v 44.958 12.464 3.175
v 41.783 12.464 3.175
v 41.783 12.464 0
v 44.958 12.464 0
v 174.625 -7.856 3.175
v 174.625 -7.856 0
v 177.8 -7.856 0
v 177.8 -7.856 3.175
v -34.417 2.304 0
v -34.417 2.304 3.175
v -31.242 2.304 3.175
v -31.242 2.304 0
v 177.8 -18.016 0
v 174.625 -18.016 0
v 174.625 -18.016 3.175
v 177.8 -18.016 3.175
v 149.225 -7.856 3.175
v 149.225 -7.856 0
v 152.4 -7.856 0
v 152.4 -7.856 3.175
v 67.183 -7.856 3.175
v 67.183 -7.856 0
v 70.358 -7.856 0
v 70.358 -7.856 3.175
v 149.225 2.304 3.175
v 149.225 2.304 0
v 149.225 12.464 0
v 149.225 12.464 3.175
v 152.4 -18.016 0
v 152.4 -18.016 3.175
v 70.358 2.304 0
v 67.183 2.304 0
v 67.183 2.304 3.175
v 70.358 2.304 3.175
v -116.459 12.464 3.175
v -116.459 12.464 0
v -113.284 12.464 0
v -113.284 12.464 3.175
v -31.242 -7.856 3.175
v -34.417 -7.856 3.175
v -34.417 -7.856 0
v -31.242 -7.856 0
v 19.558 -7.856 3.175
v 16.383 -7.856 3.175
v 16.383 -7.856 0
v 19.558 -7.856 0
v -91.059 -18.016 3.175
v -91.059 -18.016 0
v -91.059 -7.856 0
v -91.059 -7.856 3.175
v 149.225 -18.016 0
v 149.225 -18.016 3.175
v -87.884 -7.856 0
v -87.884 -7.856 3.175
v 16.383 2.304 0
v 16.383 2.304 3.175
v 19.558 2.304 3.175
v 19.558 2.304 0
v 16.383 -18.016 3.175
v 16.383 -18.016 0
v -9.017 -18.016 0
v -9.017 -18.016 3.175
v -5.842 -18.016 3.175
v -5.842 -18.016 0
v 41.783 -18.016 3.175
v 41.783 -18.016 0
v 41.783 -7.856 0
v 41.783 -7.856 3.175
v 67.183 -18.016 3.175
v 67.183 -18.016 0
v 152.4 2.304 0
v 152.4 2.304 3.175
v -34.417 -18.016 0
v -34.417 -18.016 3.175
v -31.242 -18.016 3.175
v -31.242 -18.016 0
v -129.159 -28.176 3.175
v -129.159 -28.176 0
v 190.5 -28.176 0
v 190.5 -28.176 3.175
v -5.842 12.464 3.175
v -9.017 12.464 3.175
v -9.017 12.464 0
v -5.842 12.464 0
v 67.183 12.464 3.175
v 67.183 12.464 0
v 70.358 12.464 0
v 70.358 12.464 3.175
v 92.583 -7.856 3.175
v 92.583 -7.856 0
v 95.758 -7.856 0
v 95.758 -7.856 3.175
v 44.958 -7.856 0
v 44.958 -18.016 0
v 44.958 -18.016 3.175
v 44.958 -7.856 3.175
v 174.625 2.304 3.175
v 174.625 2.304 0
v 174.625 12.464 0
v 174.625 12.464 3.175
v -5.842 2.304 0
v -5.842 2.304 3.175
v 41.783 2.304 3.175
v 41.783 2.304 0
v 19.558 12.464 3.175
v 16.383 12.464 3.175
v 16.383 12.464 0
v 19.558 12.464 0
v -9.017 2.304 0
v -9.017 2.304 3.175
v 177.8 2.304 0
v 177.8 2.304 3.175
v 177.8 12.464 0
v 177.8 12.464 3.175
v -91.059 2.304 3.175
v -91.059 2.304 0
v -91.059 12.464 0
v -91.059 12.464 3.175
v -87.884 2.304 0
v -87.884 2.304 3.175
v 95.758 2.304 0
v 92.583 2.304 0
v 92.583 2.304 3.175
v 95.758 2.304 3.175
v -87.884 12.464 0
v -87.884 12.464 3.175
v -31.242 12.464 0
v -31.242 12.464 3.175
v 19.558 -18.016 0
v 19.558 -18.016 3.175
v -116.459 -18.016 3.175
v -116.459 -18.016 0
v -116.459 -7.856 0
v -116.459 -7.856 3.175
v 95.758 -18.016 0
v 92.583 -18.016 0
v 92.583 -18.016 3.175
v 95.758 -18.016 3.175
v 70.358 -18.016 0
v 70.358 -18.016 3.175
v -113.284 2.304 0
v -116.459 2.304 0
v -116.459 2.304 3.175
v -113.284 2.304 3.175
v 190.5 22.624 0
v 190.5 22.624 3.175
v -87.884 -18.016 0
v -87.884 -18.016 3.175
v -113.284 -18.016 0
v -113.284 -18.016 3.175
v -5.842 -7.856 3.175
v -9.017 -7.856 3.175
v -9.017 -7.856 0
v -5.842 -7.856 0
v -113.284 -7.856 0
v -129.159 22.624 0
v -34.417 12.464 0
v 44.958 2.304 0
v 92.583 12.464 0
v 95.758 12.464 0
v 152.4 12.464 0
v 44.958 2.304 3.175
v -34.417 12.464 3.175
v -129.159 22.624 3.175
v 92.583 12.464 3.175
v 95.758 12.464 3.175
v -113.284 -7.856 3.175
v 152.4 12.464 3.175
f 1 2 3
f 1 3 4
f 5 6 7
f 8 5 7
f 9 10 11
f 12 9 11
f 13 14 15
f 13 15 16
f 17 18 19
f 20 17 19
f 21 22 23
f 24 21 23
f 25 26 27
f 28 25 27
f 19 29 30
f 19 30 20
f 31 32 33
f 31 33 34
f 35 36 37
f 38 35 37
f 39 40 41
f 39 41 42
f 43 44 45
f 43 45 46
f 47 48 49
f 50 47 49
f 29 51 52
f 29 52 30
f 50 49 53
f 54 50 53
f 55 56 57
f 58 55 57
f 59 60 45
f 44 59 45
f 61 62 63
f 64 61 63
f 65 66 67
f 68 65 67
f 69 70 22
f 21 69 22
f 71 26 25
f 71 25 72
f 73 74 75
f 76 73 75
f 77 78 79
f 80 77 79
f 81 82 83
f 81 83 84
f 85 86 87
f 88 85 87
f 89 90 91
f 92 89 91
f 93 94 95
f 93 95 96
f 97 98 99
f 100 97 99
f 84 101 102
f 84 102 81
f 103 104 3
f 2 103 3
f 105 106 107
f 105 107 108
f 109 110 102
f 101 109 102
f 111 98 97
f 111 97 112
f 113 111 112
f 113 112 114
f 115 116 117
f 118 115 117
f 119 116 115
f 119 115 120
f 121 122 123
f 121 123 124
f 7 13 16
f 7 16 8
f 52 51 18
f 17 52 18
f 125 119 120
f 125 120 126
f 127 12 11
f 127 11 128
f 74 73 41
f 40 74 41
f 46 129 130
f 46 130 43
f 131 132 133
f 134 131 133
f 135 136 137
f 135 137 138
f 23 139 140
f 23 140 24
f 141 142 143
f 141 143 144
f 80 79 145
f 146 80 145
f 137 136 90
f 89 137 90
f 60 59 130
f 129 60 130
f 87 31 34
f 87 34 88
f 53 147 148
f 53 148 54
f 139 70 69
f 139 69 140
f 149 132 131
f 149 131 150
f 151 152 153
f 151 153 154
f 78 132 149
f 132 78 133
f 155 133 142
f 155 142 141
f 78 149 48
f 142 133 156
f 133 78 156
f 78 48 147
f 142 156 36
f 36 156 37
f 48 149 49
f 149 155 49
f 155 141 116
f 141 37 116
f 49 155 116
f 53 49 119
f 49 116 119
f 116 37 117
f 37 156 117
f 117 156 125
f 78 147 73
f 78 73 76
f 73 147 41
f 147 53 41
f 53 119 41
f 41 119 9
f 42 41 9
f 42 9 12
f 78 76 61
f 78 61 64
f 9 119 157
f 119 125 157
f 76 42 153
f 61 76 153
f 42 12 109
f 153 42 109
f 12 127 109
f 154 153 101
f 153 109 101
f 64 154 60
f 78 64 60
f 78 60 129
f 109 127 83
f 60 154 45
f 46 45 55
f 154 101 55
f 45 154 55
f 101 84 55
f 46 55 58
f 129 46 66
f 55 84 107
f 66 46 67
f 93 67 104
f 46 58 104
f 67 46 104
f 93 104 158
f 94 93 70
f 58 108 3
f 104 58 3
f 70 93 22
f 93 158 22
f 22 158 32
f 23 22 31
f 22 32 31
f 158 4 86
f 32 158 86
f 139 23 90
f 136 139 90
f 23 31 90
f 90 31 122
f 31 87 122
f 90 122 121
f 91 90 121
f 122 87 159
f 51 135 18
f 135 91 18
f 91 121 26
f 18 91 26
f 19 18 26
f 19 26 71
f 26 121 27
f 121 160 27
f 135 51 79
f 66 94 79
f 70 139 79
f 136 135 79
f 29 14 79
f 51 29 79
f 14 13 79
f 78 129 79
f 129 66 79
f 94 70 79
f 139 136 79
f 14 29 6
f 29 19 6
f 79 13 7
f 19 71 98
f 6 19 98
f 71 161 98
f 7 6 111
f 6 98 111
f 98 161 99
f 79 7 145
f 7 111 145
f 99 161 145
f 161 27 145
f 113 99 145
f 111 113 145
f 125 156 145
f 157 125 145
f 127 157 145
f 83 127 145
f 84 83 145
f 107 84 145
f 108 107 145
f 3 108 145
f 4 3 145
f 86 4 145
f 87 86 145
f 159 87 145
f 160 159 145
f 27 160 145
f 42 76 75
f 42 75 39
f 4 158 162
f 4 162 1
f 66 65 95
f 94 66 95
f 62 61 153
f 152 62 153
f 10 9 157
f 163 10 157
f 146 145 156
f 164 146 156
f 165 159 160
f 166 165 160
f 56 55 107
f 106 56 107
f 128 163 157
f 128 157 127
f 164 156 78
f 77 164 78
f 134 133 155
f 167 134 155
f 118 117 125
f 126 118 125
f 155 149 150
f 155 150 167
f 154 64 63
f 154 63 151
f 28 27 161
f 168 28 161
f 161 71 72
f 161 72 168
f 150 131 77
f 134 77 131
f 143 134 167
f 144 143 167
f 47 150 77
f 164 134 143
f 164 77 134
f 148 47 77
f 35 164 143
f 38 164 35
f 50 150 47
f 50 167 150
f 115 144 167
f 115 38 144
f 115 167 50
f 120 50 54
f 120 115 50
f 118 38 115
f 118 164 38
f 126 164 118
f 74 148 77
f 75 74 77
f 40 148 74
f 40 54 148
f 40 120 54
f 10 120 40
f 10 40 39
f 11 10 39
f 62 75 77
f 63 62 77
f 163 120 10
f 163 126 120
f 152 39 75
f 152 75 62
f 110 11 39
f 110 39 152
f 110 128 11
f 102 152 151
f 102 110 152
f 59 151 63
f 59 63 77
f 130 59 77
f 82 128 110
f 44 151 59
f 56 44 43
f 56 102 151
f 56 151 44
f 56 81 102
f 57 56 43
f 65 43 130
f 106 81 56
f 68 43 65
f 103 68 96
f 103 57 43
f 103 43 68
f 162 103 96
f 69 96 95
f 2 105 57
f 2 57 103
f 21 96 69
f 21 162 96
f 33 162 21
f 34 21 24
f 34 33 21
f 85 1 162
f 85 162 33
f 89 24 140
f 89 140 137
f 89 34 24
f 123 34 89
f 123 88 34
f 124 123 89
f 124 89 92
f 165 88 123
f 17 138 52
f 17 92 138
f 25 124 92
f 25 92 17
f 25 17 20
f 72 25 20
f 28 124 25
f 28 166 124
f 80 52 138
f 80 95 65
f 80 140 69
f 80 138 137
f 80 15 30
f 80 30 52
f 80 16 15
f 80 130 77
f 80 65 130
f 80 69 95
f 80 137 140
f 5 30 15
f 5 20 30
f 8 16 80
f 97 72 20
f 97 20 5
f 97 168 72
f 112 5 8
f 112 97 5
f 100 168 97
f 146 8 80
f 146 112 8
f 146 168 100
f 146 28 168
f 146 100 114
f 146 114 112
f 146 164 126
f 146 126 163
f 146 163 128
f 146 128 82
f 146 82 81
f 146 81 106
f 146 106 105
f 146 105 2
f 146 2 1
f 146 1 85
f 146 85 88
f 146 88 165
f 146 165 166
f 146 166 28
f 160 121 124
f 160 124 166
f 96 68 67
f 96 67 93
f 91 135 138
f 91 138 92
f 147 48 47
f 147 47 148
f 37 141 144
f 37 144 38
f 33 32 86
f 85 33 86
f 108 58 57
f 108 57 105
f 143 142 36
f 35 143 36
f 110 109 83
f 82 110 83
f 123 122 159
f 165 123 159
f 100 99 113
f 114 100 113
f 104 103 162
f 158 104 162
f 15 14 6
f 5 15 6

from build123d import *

# Parameters (mm, degrees)
F0_W     = 3.175
F0_H     = 10.16
F1_DEPTH = 3.175


with BuildPart() as f1:
    # F0 (on Top) → F1 (new body)
    with BuildSketch(Plane.XY):
        Polygon((-129.159, -28.17584), (190.5, -28.17584), (190.5, 22.624161), (177.8, 22.624161), (174.625, 22.624161), (152.4, 22.624161), (149.225, 22.624161), (-129.159, 22.624161), align=None)
        with Locations((-114.8715, -12.93584)):
            Rectangle(F0_W, F0_H, mode=Mode.SUBTRACT)
        with Locations((-89.4715, -12.93584)):
            Rectangle(F0_W, F0_H, mode=Mode.SUBTRACT)
        with Locations((-32.8295, -12.93584)):
            Rectangle(F0_W, F0_H, mode=Mode.SUBTRACT)
        with Locations((-7.4295, -12.93584)):
            Rectangle(F0_W, F0_H, mode=Mode.SUBTRACT)
        with Locations((17.9705, -12.93584)):
            Rectangle(F0_W, F0_H, mode=Mode.SUBTRACT)
        with Locations((43.3705, -12.93584)):
            Rectangle(F0_W, F0_H, mode=Mode.SUBTRACT)
        with Locations((68.7705, -12.93584)):
            Rectangle(F0_W, F0_H, mode=Mode.SUBTRACT)
        with Locations((94.1705, -12.93584)):
            Rectangle(F0_W, F0_H, mode=Mode.SUBTRACT)
        with Locations((150.8125, -12.93584)):
            Rectangle(F0_W, F0_H, mode=Mode.SUBTRACT)
        with Locations((176.2125, -12.93584)):
            Rectangle(F0_W, F0_H, mode=Mode.SUBTRACT)
        with Locations((-114.8715, 7.384161)):
            Rectangle(F0_W, F0_H, mode=Mode.SUBTRACT)
        with Locations((-89.4715, 7.384161)):
            Rectangle(F0_W, F0_H, mode=Mode.SUBTRACT)
        with Locations((-32.8295, 7.384161)):
            Rectangle(F0_W, F0_H, mode=Mode.SUBTRACT)
        with Locations((-7.4295, 7.384161)):
            Rectangle(F0_W, F0_H, mode=Mode.SUBTRACT)
        with Locations((17.9705, 7.384161)):
            Rectangle(F0_W, F0_H, mode=Mode.SUBTRACT)
        with Locations((43.3705, 7.384161)):
            Rectangle(F0_W, F0_H, mode=Mode.SUBTRACT)
        with Locations((68.7705, 7.384161)):
            Rectangle(F0_W, F0_H, mode=Mode.SUBTRACT)
        with Locations((94.1705, 7.384161)):
            Rectangle(F0_W, F0_H, mode=Mode.SUBTRACT)
        with Locations((150.8125, 7.384161)):
            Rectangle(F0_W, F0_H, mode=Mode.SUBTRACT)
        with Locations((176.2125, 7.384161)):
            Rectangle(F0_W, F0_H, mode=Mode.SUBTRACT)
    extrude(amount=F1_DEPTH)


solid = f1.part
